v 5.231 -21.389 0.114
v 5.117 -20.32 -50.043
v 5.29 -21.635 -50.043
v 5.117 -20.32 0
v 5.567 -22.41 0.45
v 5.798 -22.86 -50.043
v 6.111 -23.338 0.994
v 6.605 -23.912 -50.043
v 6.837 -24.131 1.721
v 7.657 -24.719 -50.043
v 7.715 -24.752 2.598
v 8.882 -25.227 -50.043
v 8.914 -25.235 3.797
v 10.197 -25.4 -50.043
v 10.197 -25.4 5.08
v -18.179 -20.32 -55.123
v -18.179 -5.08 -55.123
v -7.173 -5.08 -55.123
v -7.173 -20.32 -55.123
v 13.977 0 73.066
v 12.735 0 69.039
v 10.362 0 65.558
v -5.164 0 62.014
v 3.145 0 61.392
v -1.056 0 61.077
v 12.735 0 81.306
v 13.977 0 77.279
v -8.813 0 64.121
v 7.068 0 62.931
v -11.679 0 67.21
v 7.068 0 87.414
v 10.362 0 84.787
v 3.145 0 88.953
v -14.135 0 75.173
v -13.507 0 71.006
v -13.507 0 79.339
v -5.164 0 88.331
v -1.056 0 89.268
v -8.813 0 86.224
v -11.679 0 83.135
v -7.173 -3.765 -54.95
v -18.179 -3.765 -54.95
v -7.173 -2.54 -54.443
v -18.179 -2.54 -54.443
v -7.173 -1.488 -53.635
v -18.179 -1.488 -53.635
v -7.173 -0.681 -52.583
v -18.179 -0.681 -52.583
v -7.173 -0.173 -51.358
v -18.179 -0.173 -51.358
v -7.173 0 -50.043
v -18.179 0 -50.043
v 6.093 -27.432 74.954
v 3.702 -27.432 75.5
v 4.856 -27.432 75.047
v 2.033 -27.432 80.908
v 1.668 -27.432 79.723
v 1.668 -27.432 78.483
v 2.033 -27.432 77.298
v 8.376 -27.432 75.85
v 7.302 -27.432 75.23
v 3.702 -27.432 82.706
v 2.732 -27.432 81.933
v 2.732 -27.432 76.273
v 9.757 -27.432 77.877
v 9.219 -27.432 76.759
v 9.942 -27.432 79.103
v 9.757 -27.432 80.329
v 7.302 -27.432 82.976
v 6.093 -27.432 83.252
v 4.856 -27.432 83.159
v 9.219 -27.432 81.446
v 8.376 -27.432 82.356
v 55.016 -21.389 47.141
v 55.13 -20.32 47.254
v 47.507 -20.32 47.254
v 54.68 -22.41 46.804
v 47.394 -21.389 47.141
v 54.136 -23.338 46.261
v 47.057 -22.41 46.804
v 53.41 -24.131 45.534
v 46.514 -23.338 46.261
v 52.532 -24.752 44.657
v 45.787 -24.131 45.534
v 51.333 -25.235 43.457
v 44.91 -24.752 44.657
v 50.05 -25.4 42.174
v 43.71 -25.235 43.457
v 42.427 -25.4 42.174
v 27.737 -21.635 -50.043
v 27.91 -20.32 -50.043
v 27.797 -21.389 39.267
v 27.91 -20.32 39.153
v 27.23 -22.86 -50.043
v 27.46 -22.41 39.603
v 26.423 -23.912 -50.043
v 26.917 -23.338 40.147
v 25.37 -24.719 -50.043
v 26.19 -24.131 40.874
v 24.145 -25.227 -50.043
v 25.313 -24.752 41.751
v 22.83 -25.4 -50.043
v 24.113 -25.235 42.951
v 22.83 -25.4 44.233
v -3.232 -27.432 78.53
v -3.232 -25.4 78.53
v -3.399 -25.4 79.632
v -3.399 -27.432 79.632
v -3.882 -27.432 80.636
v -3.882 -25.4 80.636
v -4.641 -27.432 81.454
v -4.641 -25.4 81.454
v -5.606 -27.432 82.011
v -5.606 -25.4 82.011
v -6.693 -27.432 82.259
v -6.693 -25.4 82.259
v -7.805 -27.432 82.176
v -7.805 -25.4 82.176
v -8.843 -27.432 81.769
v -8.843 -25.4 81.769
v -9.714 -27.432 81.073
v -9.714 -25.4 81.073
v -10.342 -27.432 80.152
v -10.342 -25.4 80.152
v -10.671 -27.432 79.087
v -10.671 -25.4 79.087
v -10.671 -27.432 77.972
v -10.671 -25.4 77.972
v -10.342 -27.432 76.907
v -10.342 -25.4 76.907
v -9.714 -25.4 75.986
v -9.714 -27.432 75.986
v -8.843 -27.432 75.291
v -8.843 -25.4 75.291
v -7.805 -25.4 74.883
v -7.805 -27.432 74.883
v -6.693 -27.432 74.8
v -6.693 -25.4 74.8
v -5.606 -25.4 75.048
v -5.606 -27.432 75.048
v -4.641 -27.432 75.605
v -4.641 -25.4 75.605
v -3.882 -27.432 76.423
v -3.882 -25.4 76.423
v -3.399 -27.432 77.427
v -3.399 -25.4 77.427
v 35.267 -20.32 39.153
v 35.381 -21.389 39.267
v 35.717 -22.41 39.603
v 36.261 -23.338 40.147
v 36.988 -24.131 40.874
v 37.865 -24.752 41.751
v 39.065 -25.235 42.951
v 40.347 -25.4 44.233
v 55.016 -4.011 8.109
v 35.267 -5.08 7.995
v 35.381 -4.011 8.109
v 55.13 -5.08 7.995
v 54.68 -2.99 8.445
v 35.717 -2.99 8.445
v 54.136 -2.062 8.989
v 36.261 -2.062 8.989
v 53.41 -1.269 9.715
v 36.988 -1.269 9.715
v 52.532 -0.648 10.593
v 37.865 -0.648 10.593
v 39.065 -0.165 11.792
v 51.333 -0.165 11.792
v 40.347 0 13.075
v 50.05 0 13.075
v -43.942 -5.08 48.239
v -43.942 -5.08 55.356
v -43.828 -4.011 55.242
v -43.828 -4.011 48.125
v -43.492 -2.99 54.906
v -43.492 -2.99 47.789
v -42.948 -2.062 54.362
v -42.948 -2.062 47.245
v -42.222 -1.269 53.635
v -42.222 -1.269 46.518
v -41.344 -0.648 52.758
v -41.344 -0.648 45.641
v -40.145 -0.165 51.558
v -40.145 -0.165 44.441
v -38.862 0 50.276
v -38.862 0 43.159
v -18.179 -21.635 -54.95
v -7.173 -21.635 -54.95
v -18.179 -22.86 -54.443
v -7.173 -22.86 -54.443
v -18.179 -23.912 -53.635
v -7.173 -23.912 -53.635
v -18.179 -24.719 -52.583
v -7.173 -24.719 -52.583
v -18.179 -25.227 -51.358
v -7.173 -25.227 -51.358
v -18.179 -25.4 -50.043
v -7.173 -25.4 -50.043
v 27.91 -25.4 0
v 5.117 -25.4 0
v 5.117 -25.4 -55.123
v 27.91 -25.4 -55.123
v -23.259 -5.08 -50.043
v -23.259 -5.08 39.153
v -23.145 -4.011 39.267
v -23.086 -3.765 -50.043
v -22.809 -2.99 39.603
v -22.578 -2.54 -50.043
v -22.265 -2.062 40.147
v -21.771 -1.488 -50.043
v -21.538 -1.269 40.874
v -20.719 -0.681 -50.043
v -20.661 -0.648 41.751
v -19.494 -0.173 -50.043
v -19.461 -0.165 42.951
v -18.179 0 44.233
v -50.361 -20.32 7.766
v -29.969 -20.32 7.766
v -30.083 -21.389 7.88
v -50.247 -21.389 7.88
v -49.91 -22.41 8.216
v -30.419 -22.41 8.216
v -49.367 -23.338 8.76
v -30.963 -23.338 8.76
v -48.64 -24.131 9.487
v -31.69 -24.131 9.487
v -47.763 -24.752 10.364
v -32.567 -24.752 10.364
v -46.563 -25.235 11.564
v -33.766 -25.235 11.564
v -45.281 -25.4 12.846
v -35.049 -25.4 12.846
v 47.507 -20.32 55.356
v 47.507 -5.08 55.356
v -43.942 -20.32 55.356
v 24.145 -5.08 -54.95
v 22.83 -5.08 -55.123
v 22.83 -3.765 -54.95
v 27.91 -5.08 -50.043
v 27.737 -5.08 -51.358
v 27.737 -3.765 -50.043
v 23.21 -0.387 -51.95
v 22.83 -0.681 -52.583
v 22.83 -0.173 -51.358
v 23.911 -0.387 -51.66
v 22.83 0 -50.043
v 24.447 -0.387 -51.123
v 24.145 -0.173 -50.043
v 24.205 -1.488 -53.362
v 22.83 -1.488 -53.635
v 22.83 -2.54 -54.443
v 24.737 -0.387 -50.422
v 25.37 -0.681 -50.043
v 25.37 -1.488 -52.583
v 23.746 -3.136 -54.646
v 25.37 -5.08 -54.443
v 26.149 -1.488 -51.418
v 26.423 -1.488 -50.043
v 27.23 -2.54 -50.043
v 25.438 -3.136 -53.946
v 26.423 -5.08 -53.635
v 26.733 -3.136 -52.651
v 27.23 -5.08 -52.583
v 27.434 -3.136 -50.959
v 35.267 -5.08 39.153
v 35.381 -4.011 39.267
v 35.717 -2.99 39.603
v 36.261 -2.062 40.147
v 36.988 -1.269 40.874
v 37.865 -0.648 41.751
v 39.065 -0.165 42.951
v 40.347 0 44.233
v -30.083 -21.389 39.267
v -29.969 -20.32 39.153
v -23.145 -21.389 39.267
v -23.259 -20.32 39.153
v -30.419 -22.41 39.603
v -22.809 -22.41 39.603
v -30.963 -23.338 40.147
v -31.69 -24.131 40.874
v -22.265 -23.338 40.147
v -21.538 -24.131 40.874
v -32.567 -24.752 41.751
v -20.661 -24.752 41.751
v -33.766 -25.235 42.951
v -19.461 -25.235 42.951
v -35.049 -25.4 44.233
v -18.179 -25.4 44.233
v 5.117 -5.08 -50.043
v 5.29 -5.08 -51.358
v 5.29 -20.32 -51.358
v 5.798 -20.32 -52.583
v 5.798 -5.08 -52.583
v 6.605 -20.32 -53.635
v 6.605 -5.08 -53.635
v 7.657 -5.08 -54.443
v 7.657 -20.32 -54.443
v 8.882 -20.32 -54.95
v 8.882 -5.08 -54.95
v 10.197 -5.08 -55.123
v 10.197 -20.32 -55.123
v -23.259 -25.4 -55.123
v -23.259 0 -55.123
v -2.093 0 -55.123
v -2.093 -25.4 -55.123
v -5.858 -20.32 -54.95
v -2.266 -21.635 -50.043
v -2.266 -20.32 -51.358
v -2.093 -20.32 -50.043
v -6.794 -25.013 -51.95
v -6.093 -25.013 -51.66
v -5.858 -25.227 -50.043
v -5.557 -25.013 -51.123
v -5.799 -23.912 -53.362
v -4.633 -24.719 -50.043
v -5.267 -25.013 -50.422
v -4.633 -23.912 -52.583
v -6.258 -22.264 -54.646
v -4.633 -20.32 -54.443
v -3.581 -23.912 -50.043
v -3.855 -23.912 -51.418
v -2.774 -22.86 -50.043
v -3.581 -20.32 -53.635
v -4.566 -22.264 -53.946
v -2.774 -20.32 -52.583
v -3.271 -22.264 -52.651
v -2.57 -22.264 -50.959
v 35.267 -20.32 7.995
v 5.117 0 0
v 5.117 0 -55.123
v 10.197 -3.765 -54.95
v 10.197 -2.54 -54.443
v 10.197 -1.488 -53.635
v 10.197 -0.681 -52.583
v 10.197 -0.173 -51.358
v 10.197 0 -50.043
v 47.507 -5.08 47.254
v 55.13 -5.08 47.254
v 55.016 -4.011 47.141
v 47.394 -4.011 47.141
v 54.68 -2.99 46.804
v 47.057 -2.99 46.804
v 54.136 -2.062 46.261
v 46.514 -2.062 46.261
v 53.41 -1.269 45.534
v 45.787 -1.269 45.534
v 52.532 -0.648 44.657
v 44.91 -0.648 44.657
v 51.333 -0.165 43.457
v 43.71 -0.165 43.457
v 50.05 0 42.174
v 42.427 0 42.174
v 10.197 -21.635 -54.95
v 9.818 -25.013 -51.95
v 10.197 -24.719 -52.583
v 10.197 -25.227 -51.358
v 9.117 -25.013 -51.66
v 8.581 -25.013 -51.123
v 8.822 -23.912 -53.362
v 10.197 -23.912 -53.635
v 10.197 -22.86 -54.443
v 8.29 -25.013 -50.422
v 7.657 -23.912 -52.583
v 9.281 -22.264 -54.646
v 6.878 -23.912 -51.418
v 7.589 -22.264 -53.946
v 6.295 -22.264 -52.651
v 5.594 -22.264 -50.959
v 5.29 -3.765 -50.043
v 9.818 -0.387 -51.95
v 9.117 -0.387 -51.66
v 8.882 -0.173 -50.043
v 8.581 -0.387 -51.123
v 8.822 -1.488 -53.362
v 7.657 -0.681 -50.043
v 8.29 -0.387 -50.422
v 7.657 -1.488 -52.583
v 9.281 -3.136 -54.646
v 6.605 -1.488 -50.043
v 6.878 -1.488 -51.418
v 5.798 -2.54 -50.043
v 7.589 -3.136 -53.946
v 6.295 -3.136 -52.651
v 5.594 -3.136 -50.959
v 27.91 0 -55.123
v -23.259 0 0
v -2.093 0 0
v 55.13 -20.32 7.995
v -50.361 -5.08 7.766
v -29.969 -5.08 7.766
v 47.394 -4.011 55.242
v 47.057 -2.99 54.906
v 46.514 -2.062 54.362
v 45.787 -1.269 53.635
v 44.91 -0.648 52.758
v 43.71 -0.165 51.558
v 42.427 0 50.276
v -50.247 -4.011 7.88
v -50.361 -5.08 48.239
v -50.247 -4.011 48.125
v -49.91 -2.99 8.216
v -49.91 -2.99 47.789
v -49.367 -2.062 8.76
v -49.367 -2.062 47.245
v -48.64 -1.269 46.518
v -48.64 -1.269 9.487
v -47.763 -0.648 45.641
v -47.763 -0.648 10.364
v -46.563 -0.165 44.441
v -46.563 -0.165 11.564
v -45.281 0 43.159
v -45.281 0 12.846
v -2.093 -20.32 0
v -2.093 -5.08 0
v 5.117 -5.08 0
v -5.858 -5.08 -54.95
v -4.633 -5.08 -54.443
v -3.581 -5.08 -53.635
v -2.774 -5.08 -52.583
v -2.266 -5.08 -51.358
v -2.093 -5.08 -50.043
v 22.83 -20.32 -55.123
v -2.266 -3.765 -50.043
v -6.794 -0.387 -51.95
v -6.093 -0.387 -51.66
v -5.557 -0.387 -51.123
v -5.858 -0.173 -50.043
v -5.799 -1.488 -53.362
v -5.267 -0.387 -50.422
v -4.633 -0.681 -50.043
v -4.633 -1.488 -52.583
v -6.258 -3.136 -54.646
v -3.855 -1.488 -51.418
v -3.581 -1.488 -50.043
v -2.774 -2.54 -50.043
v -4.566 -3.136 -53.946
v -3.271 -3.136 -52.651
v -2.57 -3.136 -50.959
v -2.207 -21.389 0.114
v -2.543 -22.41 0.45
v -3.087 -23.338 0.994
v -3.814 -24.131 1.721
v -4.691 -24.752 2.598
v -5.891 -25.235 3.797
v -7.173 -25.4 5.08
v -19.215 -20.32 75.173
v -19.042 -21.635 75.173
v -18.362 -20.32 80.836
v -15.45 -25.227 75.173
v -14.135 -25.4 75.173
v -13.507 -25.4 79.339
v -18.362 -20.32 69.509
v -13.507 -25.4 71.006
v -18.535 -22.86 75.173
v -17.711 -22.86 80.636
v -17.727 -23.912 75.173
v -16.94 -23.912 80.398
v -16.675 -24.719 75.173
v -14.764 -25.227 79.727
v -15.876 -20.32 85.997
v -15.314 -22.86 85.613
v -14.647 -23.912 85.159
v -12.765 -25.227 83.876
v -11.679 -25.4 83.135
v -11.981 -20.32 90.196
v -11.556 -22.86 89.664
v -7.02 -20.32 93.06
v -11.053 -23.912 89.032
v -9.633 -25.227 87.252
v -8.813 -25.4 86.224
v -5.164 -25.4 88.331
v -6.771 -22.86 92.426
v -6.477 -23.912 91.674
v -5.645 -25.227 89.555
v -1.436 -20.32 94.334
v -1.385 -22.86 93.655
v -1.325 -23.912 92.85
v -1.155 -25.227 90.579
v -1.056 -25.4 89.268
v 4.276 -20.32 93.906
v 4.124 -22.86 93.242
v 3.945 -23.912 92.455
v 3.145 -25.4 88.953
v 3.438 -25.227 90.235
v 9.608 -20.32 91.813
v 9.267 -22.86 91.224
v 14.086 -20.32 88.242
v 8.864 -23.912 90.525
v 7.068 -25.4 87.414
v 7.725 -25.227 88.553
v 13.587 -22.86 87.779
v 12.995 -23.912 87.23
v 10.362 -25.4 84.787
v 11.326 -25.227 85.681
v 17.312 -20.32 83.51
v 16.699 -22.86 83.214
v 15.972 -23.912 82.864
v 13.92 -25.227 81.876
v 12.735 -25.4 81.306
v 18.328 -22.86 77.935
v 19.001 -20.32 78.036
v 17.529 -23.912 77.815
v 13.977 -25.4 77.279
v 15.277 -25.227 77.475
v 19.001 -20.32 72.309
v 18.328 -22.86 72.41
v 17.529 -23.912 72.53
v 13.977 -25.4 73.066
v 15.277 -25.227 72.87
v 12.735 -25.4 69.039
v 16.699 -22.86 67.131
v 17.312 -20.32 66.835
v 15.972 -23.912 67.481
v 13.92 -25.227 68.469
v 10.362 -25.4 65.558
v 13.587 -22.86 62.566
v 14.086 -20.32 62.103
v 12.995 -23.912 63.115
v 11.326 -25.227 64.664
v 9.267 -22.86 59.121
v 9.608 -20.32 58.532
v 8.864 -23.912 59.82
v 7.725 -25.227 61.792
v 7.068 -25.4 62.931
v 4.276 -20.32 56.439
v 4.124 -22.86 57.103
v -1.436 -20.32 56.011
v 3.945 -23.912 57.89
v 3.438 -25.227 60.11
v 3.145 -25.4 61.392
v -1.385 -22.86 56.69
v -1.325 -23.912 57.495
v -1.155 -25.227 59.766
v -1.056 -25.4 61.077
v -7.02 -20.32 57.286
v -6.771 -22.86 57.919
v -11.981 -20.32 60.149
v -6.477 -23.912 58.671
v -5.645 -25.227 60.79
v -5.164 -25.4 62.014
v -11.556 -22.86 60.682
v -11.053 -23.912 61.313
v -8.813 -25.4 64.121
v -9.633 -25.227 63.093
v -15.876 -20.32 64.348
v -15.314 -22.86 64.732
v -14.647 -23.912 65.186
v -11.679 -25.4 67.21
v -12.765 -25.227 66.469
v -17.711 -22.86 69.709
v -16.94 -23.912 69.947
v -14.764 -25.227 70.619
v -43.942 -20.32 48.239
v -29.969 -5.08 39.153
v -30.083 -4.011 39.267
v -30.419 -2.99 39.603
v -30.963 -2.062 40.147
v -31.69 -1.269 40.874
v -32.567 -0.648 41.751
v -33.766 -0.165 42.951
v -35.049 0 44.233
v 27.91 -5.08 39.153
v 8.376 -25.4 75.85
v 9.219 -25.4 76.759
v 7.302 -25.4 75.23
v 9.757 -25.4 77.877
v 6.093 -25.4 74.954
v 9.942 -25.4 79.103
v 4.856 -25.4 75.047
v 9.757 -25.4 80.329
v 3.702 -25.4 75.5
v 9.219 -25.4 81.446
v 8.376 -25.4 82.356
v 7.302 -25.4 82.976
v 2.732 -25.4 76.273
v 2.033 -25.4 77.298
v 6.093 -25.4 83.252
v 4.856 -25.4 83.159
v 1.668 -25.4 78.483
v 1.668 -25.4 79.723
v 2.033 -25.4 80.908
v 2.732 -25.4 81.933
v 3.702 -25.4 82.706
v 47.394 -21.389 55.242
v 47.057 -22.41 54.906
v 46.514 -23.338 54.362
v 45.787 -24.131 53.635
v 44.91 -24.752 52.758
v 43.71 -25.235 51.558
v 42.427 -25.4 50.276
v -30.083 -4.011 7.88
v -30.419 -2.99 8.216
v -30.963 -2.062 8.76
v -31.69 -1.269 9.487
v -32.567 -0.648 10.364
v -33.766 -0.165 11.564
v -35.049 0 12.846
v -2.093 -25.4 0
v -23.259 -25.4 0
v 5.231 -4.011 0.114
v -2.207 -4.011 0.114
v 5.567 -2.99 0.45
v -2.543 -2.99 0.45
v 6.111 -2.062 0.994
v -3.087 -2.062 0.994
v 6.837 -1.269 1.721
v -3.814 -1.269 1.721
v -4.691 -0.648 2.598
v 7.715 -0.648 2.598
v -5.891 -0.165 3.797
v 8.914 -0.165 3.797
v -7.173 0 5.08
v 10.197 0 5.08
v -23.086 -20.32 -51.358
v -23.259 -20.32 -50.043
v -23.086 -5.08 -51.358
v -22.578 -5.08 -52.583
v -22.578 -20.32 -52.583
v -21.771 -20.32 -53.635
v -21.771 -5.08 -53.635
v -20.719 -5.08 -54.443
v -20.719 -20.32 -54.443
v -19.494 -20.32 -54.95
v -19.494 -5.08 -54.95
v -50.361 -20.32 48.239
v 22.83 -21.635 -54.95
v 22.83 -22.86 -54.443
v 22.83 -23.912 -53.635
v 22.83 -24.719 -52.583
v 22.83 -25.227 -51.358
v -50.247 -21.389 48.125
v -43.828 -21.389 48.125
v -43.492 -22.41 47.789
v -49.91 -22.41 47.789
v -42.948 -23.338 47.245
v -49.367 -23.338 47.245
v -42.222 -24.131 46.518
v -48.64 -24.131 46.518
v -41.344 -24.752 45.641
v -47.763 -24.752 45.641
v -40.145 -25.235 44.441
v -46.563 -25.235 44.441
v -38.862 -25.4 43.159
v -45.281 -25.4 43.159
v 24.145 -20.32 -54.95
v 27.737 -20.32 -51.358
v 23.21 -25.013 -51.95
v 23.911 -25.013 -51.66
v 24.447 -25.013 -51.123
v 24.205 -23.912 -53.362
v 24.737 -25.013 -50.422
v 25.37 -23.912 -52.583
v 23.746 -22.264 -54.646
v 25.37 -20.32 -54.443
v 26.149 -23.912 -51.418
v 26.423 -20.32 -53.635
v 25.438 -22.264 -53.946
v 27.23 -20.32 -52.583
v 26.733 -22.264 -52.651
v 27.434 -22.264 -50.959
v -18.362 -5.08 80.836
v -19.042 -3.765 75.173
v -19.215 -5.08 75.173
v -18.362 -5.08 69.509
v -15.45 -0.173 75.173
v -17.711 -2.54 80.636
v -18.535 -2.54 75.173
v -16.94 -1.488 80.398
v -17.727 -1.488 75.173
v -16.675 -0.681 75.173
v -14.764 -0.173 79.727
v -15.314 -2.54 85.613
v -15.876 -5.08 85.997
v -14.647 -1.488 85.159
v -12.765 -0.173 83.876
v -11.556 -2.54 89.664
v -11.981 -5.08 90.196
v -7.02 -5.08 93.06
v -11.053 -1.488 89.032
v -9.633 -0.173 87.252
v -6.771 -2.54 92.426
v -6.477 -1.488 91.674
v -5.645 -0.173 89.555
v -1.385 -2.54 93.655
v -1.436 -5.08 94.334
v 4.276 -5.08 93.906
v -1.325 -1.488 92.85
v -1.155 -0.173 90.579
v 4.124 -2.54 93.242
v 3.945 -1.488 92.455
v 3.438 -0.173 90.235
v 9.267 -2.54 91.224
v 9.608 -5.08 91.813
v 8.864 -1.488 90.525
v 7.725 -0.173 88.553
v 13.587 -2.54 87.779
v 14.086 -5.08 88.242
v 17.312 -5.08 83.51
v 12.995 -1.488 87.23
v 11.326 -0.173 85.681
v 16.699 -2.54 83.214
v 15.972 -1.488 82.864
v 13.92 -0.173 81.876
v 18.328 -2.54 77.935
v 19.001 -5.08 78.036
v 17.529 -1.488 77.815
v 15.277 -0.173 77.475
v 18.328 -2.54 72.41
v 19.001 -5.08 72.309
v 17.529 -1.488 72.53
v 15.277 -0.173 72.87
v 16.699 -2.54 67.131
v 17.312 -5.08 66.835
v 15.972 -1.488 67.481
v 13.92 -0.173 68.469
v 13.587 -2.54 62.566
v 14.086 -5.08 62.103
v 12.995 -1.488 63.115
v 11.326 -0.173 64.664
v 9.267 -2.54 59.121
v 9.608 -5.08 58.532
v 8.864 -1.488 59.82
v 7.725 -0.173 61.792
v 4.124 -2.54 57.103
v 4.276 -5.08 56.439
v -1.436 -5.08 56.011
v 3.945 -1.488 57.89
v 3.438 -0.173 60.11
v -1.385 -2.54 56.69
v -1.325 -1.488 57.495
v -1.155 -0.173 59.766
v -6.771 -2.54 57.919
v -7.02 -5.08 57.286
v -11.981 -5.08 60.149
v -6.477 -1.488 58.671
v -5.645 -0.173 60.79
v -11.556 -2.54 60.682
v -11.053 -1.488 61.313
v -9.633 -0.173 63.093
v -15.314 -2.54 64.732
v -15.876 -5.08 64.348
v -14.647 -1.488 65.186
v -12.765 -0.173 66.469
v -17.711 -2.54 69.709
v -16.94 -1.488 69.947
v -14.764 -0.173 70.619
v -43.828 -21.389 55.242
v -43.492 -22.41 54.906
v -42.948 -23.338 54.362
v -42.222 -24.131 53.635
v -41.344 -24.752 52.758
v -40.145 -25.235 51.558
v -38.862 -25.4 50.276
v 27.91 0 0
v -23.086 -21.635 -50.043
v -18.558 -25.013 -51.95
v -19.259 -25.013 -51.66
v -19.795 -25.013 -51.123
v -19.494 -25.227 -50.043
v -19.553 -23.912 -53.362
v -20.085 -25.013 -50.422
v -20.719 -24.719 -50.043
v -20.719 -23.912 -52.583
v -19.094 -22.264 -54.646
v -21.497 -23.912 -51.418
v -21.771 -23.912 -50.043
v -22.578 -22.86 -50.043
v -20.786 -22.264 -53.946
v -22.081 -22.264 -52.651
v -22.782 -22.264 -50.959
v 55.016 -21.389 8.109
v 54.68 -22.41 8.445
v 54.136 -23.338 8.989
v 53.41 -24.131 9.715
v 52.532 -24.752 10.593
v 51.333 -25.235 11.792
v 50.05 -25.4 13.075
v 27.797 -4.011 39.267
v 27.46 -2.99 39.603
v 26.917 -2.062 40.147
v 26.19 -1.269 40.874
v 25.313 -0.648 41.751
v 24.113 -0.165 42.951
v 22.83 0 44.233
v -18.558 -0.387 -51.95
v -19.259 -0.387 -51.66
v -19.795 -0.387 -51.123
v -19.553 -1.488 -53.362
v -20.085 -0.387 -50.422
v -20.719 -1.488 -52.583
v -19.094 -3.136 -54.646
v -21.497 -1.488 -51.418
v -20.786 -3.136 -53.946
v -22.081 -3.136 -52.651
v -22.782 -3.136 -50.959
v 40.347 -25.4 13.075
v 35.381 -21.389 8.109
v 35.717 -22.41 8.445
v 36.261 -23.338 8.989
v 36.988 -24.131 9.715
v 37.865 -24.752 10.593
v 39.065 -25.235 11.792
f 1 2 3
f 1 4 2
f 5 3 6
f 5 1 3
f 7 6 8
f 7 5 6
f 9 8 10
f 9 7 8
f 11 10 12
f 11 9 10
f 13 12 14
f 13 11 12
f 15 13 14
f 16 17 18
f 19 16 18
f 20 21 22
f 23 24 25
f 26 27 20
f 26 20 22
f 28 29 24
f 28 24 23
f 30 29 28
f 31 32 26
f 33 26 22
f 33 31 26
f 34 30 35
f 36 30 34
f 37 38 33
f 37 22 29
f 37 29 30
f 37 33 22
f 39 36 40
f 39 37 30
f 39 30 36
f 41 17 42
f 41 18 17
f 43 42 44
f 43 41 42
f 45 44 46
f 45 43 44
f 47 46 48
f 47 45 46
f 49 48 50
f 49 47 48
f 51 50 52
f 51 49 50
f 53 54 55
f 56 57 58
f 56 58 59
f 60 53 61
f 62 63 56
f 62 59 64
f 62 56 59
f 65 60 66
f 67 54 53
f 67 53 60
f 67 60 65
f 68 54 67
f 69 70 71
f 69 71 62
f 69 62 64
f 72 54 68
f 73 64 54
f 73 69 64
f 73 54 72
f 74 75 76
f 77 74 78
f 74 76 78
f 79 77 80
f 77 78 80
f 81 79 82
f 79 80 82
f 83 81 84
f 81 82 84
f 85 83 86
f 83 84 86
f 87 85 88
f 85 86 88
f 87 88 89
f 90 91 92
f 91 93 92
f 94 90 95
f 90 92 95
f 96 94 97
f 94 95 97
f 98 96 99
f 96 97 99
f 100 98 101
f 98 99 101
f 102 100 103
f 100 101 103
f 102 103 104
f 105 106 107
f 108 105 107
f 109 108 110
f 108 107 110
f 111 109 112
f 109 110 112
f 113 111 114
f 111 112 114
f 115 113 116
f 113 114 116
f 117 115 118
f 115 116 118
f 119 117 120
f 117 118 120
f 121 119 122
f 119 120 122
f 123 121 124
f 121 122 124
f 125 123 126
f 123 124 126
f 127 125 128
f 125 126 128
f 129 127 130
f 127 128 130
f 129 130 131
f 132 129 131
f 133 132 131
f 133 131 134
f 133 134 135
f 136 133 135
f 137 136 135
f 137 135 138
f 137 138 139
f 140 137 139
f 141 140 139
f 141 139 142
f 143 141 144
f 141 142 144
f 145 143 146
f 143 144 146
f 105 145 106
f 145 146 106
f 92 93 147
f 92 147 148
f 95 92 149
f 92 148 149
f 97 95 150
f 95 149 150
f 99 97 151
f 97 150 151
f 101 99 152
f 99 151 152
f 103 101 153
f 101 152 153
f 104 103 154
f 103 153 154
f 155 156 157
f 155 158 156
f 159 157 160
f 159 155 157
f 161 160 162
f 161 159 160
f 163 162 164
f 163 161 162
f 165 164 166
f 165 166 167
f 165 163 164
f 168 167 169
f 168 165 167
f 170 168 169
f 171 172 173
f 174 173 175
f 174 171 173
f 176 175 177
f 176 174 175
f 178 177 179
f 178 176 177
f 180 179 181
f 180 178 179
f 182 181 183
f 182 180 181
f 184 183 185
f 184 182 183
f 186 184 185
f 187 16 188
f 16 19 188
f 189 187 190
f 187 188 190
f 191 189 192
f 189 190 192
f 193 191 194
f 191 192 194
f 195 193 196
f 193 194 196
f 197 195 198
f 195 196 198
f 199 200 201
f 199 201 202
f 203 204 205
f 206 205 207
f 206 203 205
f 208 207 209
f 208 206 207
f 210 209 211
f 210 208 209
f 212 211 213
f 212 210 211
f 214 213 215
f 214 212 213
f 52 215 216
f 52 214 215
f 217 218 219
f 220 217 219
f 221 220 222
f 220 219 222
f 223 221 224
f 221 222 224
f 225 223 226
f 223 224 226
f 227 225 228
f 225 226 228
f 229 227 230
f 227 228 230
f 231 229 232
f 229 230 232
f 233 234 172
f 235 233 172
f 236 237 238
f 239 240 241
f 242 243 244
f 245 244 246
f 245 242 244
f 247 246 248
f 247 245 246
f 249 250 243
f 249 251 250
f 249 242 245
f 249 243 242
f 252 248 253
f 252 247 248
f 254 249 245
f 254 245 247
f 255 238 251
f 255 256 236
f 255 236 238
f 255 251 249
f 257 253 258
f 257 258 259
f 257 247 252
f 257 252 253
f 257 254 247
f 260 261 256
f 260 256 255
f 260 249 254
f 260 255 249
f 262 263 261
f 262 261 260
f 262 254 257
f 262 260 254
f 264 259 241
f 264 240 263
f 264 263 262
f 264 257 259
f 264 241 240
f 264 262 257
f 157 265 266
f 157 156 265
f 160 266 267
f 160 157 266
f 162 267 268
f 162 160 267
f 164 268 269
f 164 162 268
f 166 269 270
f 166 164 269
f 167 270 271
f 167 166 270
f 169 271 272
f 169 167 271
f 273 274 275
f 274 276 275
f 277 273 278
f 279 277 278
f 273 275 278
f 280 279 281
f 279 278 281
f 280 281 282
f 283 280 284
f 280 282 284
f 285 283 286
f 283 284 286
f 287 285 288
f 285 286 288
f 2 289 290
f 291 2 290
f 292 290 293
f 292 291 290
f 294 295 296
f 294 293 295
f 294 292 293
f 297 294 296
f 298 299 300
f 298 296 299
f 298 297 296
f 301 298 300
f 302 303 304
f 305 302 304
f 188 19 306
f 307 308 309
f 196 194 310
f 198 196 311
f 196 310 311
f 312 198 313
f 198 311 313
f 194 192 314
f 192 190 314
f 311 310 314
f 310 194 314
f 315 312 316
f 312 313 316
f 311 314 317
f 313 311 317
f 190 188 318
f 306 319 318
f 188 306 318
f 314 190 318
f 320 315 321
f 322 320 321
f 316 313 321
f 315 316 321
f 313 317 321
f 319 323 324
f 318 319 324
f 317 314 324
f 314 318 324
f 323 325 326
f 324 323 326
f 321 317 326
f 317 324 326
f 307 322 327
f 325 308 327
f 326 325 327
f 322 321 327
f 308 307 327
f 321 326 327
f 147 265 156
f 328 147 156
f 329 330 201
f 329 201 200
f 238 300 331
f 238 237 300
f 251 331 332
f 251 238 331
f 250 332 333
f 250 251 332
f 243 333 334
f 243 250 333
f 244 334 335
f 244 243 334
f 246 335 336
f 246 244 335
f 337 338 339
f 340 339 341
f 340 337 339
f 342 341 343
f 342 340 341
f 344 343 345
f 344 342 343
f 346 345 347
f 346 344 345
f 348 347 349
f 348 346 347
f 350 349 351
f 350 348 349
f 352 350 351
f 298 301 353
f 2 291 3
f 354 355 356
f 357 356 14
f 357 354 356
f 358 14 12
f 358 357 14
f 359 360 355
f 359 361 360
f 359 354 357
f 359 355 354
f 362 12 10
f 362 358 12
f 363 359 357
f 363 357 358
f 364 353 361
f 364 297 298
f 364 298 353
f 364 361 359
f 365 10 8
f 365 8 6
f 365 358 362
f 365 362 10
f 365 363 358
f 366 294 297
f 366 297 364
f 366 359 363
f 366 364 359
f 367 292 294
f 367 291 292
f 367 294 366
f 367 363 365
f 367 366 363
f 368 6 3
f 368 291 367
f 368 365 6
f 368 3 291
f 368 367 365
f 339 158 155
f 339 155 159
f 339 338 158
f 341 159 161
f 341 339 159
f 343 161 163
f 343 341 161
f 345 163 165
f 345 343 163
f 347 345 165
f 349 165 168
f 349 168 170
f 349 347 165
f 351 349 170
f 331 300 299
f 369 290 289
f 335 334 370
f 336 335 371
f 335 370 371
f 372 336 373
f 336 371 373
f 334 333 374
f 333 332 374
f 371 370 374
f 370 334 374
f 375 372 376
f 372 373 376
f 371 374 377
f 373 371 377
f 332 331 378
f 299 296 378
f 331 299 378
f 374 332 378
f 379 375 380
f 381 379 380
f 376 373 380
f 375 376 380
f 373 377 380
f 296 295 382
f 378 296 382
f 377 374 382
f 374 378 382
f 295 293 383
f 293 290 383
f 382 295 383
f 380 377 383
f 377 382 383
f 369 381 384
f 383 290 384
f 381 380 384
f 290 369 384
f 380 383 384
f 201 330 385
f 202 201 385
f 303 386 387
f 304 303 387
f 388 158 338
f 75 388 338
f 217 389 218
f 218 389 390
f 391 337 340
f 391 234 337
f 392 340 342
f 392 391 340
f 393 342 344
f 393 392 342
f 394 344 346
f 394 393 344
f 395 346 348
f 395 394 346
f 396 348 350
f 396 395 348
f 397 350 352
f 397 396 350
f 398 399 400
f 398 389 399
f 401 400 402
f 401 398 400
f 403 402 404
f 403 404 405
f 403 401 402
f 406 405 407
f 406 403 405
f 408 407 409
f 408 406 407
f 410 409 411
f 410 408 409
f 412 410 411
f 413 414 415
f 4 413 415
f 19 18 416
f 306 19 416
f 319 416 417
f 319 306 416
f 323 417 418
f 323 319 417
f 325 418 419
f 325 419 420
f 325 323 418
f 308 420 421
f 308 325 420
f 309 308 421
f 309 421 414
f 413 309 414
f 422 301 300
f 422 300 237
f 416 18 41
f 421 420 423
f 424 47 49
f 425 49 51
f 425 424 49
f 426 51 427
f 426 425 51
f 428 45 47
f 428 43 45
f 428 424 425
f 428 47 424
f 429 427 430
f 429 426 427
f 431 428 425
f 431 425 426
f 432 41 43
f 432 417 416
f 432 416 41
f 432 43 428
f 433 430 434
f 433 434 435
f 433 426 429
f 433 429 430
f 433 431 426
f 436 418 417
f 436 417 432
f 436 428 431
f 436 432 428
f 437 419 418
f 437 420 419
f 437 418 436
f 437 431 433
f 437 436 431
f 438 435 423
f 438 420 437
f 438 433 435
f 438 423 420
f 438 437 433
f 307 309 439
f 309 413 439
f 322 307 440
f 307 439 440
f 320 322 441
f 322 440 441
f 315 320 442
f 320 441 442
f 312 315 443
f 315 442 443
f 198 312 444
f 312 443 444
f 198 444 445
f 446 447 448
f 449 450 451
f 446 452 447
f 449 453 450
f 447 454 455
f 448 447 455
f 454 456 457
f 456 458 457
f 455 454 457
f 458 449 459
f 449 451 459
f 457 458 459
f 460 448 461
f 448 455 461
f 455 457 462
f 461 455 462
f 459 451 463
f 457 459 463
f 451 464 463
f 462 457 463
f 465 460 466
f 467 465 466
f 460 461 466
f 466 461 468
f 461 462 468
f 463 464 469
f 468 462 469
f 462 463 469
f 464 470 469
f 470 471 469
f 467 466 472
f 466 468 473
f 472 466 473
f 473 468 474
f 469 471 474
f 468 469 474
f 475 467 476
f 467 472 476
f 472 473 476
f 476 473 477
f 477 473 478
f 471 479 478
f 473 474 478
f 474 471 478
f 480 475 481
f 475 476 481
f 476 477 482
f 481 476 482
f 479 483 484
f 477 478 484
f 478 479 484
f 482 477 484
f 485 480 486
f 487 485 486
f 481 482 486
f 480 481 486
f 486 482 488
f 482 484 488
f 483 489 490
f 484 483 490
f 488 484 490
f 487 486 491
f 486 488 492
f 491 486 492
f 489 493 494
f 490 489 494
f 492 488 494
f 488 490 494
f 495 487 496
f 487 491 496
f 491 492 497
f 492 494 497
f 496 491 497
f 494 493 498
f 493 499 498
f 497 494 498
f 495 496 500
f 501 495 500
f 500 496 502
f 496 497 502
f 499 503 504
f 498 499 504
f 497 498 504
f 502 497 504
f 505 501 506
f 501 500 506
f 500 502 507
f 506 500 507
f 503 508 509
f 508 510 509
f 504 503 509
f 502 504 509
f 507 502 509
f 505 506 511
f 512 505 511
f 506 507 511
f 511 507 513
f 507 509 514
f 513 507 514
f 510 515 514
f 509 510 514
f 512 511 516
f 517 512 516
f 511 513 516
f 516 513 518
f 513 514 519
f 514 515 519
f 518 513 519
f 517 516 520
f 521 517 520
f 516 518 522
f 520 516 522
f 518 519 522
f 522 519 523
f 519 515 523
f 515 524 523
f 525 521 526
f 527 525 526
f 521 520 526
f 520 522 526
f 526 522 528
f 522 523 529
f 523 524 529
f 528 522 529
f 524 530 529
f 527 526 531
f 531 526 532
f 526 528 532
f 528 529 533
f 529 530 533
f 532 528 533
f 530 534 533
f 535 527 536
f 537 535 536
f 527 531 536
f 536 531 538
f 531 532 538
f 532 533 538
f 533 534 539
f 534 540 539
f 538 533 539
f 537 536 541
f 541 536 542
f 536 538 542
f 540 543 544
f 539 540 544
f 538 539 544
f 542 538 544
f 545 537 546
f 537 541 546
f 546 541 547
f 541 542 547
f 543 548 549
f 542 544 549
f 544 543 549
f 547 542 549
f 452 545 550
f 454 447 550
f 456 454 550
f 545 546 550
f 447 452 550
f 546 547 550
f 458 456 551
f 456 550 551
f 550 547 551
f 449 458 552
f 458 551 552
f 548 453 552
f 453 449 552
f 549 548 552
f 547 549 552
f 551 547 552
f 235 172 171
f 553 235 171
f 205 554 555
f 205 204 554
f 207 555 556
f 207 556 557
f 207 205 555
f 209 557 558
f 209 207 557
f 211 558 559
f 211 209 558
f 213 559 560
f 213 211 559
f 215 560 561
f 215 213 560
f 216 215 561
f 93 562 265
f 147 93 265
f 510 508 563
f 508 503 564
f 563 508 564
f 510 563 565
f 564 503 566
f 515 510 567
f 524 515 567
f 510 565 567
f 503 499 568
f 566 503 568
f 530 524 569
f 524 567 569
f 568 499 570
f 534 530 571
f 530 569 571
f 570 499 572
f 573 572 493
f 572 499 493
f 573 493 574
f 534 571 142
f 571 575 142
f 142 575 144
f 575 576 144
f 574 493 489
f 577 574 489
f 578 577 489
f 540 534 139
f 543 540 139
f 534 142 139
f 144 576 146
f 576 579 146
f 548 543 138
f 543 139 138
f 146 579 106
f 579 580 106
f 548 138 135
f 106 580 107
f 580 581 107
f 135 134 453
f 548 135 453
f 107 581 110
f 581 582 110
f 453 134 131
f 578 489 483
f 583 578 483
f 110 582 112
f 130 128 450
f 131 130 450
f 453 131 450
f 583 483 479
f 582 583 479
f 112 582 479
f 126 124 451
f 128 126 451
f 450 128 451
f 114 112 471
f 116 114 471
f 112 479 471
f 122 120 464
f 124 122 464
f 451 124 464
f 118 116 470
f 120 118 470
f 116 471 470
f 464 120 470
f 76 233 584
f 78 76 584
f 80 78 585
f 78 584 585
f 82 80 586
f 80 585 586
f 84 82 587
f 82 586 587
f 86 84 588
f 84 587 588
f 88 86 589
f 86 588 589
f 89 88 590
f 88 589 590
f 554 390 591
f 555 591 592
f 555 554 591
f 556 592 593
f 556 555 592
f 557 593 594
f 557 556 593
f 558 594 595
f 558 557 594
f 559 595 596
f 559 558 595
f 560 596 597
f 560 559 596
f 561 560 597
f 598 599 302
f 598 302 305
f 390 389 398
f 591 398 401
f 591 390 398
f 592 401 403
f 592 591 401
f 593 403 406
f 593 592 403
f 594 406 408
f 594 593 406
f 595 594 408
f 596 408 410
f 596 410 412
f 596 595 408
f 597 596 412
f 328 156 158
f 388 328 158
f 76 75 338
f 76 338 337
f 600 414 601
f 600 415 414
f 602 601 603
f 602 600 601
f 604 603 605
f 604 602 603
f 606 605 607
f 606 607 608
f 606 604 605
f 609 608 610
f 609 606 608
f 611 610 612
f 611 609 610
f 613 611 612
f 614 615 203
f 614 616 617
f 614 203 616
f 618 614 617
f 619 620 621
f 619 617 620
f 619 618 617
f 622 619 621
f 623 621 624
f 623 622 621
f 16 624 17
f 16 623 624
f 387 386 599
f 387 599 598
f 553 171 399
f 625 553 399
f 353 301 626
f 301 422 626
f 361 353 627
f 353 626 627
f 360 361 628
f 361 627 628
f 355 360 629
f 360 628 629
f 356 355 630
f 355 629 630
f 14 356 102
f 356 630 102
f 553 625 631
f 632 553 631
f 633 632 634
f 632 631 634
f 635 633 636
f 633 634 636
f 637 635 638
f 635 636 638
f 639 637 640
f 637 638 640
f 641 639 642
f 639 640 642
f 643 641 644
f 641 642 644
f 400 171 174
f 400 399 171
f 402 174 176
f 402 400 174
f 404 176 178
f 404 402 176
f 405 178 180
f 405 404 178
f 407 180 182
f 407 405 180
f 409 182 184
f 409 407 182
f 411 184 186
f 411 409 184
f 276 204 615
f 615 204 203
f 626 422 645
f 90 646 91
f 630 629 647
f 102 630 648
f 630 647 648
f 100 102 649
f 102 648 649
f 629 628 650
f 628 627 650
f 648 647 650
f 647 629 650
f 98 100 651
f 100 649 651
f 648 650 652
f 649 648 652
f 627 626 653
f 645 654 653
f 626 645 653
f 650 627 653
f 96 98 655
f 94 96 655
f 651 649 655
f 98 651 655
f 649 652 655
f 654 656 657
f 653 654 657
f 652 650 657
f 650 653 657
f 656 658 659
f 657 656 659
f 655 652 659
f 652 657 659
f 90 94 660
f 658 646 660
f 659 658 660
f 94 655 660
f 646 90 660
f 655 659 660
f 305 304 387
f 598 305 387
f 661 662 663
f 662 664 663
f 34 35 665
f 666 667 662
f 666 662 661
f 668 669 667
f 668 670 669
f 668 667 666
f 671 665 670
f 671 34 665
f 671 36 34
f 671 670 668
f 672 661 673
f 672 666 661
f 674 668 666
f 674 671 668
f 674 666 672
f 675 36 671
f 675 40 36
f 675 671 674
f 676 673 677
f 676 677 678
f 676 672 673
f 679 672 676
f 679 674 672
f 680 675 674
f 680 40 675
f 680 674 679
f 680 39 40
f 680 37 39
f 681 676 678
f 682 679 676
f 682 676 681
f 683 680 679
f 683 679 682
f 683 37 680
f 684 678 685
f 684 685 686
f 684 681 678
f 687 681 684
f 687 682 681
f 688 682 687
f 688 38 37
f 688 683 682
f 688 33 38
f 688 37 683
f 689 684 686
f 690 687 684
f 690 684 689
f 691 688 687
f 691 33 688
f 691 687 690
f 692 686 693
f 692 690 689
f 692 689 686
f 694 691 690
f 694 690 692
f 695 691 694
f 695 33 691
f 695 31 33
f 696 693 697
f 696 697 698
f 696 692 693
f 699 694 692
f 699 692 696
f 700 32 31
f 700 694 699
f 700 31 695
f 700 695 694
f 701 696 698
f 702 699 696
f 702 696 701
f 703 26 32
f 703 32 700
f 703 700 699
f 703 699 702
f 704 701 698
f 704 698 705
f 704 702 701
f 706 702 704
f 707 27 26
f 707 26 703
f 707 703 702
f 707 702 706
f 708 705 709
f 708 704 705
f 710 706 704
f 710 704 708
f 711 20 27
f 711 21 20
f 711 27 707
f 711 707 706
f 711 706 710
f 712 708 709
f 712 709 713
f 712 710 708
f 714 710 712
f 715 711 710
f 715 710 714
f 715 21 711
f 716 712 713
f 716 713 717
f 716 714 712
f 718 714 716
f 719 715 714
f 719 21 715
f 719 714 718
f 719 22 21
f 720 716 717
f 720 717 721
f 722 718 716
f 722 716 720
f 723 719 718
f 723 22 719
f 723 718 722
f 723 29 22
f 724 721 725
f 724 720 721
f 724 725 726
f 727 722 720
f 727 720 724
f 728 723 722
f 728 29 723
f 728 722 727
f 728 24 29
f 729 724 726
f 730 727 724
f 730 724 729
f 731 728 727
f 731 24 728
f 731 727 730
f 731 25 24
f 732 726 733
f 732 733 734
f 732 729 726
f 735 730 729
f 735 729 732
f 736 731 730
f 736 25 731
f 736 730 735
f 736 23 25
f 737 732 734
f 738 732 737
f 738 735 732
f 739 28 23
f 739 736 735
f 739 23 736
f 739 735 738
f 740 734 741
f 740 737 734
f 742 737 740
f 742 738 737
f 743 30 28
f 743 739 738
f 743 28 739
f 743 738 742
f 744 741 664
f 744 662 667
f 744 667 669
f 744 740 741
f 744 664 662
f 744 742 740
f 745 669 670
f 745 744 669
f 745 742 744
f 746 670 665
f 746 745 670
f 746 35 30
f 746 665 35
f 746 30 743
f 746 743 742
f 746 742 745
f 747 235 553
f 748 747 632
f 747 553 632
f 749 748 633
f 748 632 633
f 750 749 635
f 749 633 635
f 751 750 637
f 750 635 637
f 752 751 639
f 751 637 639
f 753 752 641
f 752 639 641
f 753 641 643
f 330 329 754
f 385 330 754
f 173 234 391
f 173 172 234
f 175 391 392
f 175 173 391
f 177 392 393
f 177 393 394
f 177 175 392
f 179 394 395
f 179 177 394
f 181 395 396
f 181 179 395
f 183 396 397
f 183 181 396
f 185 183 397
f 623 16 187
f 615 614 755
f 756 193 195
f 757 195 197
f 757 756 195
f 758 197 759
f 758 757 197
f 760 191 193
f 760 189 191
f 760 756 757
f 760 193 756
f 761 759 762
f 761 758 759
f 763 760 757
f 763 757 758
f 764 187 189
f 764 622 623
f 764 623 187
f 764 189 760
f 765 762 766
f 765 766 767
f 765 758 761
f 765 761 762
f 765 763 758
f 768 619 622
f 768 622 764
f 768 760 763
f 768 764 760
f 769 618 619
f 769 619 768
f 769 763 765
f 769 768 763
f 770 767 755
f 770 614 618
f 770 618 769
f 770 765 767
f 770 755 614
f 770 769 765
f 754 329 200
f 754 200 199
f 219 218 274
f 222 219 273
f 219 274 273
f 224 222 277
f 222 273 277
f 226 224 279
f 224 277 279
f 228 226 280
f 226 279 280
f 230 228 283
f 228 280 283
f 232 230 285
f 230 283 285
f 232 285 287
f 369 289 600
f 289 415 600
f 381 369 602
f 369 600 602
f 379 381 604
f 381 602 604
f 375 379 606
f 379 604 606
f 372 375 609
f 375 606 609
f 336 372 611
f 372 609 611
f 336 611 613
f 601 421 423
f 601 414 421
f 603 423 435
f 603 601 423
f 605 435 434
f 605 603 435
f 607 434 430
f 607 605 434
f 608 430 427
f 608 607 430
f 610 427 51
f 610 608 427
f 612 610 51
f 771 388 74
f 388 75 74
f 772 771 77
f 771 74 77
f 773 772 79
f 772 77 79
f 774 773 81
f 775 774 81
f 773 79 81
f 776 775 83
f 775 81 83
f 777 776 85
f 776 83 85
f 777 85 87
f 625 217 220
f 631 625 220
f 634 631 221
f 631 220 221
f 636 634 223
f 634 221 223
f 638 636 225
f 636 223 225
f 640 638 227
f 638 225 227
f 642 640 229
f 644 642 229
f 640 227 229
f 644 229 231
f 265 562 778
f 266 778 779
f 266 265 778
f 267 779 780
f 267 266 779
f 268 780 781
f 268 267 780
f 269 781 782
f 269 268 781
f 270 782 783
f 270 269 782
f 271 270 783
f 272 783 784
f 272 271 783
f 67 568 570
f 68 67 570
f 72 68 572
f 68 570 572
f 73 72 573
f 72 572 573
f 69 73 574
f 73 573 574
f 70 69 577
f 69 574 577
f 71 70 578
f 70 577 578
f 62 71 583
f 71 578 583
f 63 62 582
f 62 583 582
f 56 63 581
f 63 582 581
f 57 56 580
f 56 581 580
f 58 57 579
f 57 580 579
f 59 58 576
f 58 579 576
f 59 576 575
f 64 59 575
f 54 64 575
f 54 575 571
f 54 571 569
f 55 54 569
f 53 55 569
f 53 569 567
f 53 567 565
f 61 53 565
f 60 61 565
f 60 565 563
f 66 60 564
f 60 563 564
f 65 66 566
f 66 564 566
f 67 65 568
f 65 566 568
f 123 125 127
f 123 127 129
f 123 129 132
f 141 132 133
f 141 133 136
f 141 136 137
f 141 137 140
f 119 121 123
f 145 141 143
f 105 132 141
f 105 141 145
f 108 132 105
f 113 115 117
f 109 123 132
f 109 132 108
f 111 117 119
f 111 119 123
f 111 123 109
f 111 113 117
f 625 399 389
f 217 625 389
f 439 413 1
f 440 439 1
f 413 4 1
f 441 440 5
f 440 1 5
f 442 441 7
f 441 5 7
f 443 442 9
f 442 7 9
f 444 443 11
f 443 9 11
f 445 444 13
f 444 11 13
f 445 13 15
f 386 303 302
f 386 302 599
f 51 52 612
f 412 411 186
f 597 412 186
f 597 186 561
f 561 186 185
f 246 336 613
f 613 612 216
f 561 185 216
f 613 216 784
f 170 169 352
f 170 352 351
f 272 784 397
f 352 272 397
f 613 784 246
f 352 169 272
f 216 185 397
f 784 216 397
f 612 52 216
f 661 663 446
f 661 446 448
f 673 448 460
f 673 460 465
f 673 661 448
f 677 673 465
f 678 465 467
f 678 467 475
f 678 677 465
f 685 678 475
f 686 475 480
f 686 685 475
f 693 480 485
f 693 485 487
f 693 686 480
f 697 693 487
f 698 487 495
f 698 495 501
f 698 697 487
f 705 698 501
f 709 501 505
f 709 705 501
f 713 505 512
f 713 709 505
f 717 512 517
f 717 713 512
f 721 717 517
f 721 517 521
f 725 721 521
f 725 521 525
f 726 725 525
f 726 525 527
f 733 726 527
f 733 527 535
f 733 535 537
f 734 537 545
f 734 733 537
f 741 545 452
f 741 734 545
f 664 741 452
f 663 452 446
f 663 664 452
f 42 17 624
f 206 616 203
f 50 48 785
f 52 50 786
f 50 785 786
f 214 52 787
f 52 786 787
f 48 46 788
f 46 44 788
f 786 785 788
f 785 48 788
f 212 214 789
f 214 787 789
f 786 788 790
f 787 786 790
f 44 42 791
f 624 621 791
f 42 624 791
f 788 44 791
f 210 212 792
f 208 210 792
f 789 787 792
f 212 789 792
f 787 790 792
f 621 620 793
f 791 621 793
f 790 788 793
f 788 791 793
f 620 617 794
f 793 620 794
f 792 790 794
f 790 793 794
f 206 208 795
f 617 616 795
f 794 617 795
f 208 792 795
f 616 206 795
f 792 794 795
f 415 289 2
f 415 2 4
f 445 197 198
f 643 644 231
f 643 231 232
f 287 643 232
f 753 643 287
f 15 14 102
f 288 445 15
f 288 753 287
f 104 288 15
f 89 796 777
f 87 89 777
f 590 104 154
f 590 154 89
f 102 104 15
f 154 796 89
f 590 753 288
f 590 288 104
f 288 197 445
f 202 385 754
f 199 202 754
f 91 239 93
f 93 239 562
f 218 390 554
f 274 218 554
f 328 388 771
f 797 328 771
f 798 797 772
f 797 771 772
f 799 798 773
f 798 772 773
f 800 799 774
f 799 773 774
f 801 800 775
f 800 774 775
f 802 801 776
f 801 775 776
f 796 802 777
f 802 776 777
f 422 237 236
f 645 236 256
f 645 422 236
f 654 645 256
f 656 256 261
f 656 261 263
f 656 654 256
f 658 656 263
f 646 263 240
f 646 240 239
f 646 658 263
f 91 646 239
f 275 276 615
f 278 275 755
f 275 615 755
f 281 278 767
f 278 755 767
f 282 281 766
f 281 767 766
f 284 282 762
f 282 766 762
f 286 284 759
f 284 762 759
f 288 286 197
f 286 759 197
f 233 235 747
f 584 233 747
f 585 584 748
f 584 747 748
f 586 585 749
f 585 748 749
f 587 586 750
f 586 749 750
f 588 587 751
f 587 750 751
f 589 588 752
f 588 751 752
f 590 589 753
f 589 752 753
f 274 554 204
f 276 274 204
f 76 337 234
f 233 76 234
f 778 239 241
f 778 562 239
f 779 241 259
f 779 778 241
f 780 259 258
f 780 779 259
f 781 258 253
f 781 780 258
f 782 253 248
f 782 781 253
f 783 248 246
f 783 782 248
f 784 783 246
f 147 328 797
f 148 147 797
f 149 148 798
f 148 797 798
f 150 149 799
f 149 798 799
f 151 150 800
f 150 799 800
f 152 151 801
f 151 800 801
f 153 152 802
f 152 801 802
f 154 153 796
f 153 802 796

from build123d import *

# Parameters (mm, degrees)
F0_W     = 21.1654354353
F0_H     = 55.1231652498
F1_DEPTH = 25.4
F0_W_2   = 22.7935481817
F0_W_3   = 13.9731224626
F0_H_2   = 9.0853758156
F0_W_4   = 12.2400671244
F0_H_3   = 8.1012733281
F2_DEPTH = 25.4
F3_R     = 5.08
F4_R     = 19.2152622129
F5_DEPTH = 25.4
F6_R     = 5.08
F7_R     = 3.7400653386
F7_R_2   = 4.1602495274
F8_DEPTH = 2.032


with BuildPart() as f1:
    # F0 (on Front) → F1 (new body)
    with BuildSketch(Plane.XZ):
        with Locations((-12.6760037383, -27.5615826249)):
            Rectangle(F0_W, F0_H)
    extrude(amount=F1_DEPTH)


with BuildPart() as f1b:
    # F0 (on Front) → F1, piece 2 (new body)
    with BuildSketch(Plane.XZ):
        with Locations((16.5136931464, -27.5615826249)):
            Rectangle(F0_W_2, F0_H)
    extrude(amount=F1_DEPTH)


with BuildPart() as f2:
    # F0 (on Front) → F2 (new body)
    with BuildSketch(Plane.XZ):
        Polygon((-23.2587214559, 39.1532070935), (-23.2587214559, 0), (-2.0932860207, 0), (5.1169190556, 0), (27.9104672372, 0), (27.9104672372, 39.1532070935), (27.9104672372, 55.3557537496), (-23.2587214559, 55.3557537496), align=None)
        with Locations((-12.6760037383, -27.5615826249)):
            Rectangle(F0_W, F0_H)
        Polygon((-29.9691427499, 39.1532070935), (-23.2587214559, 39.1532070935), (-23.2587214559, 55.3557537496), (-43.9422652125, 55.3557537496), (-43.9422652125, 48.2385829091), (-29.9691427499, 48.2385829091), align=None)
        with Locations((16.5136931464, -27.5615826249)):
            Rectangle(F0_W_2, F0_H)
        Polygon((-29.9691427499, 7.7662086114), (-29.9691427499, 39.1532070935), (-43.9422652125, 39.1532070935), (-43.9422652125, 48.2385829091), (-50.3605343401, 48.2385829091), (-50.3605343401, 7.7662086114), align=None)
        with Locations((-36.9557039812, 43.6958950013)):
            Rectangle(F0_W_3, F0_H_2)
        Polygon((47.507353127, 55.3557537496), (27.9104672372, 55.3557537496), (27.9104672372, 39.1532070935), (35.2672860026, 39.1532070935), (35.2672860026, 47.2544804215), (47.507353127, 47.2544804215), align=None)
        with Locations((41.3873195648, 43.2038437575)):
            Rectangle(F0_W_4, F0_H_3)
        Polygon((47.507353127, 39.1532070935), (35.2672860026, 39.1532070935), (35.2672860026, 7.9948278144), (55.1300533116, 7.9948278144), (55.1300533116, 47.2544804215), (47.507353127, 47.2544804215), align=None)
    extrude(amount=F2_DEPTH)

    # F3
    f3_edges = [f2.edges().sort_by_distance(p)[0] for p in [
        (5.116919, -12.7, -55.123165),
        (27.910467, -12.7, -55.123165),
        (16.513693, 0, -55.123165),
        (16.513693, -25.4, -55.123165),
        (-23.258721, -12.7, -55.123165),
        (-2.093286, -12.7, -55.123165),
        (-12.676004, 0, -55.123165),
        (-12.676004, -25.4, -55.123165),
        (-2.093286, 0, -27.561583),
        (1.511817, 0, 0),
        (5.116919, 0, -27.561583),
        (27.910467, 0, -7.984979),
        (31.588877, 0, 39.153207),
        (35.267286, 0, 23.574017),
        (45.19867, 0, 7.994828),
        (55.130053, 0, 27.624654),
        (51.318703, 0, 47.25448),
        (47.507353, 0, 51.305117),
        (1.782544, 0, 55.355754),
        (-43.942265, 0, 51.797168),
        (-47.1514, 0, 48.238583),
        (-50.360534, 0, 28.002396),
        (-40.164839, 0, 7.766209),
        (-29.969143, 0, 23.459708),
        (-26.613932, 0, 39.153207),
        (-23.258721, 0, -7.984979),
        (-2.093286, -25.4, -27.561583),
        (1.511817, -25.4, 0),
        (5.116919, -25.4, -27.561583),
        (27.910467, -25.4, -7.984979),
        (31.588877, -25.4, 39.153207),
        (35.267286, -25.4, 23.574017),
        (45.19867, -25.4, 7.994828),
        (55.130053, -25.4, 27.624654),
        (51.318703, -25.4, 47.25448),
        (47.507353, -25.4, 51.305117),
        (1.782544, -25.4, 55.355754),
        (-43.942265, -25.4, 51.797168),
        (-47.1514, -25.4, 48.238583),
        (-50.360534, -25.4, 28.002396),
        (-40.164839, -25.4, 7.766209),
        (-29.969143, -25.4, 23.459708),
        (-26.613932, -25.4, 39.153207),
        (-23.258721, -25.4, -7.984979),
    ]]
    fillet(f3_edges, radius=F3_R)


with BuildPart() as f5:
    # F4 (on face) → F5 (new body)
    with BuildSketch(Plane(origin=(0, 0, 0), x_dir=(-1, 0, 0), z_dir=(0, 1, 0))):
        with Locations((0, 75.1725286245)):
            Circle(F4_R)
    extrude(amount=-F5_DEPTH)

    # F6
    f6_edges = [f5.edges().sort_by_distance(p)[0] for p in [
        (19.215262, -25.4, 75.172529),
        (19.215262, 0, 75.172529),
        (-19.215262, -12.7, 75.172529),
    ]]
    fillet(f6_edges, radius=F6_R)

    # F7 (on face) → F8 (join)
    with BuildSketch(Plane.XZ.offset(25.4)):
        with Locations((-6.9725243375, 78.529573977)):
            Circle(F7_R)
        with Locations((5.7816337794, 79.1029334068)):
            Circle(F7_R_2)
    extrude(amount=F8_DEPTH)


solid = Compound([f1.part, f1b.part, f2.part, f5.part])
